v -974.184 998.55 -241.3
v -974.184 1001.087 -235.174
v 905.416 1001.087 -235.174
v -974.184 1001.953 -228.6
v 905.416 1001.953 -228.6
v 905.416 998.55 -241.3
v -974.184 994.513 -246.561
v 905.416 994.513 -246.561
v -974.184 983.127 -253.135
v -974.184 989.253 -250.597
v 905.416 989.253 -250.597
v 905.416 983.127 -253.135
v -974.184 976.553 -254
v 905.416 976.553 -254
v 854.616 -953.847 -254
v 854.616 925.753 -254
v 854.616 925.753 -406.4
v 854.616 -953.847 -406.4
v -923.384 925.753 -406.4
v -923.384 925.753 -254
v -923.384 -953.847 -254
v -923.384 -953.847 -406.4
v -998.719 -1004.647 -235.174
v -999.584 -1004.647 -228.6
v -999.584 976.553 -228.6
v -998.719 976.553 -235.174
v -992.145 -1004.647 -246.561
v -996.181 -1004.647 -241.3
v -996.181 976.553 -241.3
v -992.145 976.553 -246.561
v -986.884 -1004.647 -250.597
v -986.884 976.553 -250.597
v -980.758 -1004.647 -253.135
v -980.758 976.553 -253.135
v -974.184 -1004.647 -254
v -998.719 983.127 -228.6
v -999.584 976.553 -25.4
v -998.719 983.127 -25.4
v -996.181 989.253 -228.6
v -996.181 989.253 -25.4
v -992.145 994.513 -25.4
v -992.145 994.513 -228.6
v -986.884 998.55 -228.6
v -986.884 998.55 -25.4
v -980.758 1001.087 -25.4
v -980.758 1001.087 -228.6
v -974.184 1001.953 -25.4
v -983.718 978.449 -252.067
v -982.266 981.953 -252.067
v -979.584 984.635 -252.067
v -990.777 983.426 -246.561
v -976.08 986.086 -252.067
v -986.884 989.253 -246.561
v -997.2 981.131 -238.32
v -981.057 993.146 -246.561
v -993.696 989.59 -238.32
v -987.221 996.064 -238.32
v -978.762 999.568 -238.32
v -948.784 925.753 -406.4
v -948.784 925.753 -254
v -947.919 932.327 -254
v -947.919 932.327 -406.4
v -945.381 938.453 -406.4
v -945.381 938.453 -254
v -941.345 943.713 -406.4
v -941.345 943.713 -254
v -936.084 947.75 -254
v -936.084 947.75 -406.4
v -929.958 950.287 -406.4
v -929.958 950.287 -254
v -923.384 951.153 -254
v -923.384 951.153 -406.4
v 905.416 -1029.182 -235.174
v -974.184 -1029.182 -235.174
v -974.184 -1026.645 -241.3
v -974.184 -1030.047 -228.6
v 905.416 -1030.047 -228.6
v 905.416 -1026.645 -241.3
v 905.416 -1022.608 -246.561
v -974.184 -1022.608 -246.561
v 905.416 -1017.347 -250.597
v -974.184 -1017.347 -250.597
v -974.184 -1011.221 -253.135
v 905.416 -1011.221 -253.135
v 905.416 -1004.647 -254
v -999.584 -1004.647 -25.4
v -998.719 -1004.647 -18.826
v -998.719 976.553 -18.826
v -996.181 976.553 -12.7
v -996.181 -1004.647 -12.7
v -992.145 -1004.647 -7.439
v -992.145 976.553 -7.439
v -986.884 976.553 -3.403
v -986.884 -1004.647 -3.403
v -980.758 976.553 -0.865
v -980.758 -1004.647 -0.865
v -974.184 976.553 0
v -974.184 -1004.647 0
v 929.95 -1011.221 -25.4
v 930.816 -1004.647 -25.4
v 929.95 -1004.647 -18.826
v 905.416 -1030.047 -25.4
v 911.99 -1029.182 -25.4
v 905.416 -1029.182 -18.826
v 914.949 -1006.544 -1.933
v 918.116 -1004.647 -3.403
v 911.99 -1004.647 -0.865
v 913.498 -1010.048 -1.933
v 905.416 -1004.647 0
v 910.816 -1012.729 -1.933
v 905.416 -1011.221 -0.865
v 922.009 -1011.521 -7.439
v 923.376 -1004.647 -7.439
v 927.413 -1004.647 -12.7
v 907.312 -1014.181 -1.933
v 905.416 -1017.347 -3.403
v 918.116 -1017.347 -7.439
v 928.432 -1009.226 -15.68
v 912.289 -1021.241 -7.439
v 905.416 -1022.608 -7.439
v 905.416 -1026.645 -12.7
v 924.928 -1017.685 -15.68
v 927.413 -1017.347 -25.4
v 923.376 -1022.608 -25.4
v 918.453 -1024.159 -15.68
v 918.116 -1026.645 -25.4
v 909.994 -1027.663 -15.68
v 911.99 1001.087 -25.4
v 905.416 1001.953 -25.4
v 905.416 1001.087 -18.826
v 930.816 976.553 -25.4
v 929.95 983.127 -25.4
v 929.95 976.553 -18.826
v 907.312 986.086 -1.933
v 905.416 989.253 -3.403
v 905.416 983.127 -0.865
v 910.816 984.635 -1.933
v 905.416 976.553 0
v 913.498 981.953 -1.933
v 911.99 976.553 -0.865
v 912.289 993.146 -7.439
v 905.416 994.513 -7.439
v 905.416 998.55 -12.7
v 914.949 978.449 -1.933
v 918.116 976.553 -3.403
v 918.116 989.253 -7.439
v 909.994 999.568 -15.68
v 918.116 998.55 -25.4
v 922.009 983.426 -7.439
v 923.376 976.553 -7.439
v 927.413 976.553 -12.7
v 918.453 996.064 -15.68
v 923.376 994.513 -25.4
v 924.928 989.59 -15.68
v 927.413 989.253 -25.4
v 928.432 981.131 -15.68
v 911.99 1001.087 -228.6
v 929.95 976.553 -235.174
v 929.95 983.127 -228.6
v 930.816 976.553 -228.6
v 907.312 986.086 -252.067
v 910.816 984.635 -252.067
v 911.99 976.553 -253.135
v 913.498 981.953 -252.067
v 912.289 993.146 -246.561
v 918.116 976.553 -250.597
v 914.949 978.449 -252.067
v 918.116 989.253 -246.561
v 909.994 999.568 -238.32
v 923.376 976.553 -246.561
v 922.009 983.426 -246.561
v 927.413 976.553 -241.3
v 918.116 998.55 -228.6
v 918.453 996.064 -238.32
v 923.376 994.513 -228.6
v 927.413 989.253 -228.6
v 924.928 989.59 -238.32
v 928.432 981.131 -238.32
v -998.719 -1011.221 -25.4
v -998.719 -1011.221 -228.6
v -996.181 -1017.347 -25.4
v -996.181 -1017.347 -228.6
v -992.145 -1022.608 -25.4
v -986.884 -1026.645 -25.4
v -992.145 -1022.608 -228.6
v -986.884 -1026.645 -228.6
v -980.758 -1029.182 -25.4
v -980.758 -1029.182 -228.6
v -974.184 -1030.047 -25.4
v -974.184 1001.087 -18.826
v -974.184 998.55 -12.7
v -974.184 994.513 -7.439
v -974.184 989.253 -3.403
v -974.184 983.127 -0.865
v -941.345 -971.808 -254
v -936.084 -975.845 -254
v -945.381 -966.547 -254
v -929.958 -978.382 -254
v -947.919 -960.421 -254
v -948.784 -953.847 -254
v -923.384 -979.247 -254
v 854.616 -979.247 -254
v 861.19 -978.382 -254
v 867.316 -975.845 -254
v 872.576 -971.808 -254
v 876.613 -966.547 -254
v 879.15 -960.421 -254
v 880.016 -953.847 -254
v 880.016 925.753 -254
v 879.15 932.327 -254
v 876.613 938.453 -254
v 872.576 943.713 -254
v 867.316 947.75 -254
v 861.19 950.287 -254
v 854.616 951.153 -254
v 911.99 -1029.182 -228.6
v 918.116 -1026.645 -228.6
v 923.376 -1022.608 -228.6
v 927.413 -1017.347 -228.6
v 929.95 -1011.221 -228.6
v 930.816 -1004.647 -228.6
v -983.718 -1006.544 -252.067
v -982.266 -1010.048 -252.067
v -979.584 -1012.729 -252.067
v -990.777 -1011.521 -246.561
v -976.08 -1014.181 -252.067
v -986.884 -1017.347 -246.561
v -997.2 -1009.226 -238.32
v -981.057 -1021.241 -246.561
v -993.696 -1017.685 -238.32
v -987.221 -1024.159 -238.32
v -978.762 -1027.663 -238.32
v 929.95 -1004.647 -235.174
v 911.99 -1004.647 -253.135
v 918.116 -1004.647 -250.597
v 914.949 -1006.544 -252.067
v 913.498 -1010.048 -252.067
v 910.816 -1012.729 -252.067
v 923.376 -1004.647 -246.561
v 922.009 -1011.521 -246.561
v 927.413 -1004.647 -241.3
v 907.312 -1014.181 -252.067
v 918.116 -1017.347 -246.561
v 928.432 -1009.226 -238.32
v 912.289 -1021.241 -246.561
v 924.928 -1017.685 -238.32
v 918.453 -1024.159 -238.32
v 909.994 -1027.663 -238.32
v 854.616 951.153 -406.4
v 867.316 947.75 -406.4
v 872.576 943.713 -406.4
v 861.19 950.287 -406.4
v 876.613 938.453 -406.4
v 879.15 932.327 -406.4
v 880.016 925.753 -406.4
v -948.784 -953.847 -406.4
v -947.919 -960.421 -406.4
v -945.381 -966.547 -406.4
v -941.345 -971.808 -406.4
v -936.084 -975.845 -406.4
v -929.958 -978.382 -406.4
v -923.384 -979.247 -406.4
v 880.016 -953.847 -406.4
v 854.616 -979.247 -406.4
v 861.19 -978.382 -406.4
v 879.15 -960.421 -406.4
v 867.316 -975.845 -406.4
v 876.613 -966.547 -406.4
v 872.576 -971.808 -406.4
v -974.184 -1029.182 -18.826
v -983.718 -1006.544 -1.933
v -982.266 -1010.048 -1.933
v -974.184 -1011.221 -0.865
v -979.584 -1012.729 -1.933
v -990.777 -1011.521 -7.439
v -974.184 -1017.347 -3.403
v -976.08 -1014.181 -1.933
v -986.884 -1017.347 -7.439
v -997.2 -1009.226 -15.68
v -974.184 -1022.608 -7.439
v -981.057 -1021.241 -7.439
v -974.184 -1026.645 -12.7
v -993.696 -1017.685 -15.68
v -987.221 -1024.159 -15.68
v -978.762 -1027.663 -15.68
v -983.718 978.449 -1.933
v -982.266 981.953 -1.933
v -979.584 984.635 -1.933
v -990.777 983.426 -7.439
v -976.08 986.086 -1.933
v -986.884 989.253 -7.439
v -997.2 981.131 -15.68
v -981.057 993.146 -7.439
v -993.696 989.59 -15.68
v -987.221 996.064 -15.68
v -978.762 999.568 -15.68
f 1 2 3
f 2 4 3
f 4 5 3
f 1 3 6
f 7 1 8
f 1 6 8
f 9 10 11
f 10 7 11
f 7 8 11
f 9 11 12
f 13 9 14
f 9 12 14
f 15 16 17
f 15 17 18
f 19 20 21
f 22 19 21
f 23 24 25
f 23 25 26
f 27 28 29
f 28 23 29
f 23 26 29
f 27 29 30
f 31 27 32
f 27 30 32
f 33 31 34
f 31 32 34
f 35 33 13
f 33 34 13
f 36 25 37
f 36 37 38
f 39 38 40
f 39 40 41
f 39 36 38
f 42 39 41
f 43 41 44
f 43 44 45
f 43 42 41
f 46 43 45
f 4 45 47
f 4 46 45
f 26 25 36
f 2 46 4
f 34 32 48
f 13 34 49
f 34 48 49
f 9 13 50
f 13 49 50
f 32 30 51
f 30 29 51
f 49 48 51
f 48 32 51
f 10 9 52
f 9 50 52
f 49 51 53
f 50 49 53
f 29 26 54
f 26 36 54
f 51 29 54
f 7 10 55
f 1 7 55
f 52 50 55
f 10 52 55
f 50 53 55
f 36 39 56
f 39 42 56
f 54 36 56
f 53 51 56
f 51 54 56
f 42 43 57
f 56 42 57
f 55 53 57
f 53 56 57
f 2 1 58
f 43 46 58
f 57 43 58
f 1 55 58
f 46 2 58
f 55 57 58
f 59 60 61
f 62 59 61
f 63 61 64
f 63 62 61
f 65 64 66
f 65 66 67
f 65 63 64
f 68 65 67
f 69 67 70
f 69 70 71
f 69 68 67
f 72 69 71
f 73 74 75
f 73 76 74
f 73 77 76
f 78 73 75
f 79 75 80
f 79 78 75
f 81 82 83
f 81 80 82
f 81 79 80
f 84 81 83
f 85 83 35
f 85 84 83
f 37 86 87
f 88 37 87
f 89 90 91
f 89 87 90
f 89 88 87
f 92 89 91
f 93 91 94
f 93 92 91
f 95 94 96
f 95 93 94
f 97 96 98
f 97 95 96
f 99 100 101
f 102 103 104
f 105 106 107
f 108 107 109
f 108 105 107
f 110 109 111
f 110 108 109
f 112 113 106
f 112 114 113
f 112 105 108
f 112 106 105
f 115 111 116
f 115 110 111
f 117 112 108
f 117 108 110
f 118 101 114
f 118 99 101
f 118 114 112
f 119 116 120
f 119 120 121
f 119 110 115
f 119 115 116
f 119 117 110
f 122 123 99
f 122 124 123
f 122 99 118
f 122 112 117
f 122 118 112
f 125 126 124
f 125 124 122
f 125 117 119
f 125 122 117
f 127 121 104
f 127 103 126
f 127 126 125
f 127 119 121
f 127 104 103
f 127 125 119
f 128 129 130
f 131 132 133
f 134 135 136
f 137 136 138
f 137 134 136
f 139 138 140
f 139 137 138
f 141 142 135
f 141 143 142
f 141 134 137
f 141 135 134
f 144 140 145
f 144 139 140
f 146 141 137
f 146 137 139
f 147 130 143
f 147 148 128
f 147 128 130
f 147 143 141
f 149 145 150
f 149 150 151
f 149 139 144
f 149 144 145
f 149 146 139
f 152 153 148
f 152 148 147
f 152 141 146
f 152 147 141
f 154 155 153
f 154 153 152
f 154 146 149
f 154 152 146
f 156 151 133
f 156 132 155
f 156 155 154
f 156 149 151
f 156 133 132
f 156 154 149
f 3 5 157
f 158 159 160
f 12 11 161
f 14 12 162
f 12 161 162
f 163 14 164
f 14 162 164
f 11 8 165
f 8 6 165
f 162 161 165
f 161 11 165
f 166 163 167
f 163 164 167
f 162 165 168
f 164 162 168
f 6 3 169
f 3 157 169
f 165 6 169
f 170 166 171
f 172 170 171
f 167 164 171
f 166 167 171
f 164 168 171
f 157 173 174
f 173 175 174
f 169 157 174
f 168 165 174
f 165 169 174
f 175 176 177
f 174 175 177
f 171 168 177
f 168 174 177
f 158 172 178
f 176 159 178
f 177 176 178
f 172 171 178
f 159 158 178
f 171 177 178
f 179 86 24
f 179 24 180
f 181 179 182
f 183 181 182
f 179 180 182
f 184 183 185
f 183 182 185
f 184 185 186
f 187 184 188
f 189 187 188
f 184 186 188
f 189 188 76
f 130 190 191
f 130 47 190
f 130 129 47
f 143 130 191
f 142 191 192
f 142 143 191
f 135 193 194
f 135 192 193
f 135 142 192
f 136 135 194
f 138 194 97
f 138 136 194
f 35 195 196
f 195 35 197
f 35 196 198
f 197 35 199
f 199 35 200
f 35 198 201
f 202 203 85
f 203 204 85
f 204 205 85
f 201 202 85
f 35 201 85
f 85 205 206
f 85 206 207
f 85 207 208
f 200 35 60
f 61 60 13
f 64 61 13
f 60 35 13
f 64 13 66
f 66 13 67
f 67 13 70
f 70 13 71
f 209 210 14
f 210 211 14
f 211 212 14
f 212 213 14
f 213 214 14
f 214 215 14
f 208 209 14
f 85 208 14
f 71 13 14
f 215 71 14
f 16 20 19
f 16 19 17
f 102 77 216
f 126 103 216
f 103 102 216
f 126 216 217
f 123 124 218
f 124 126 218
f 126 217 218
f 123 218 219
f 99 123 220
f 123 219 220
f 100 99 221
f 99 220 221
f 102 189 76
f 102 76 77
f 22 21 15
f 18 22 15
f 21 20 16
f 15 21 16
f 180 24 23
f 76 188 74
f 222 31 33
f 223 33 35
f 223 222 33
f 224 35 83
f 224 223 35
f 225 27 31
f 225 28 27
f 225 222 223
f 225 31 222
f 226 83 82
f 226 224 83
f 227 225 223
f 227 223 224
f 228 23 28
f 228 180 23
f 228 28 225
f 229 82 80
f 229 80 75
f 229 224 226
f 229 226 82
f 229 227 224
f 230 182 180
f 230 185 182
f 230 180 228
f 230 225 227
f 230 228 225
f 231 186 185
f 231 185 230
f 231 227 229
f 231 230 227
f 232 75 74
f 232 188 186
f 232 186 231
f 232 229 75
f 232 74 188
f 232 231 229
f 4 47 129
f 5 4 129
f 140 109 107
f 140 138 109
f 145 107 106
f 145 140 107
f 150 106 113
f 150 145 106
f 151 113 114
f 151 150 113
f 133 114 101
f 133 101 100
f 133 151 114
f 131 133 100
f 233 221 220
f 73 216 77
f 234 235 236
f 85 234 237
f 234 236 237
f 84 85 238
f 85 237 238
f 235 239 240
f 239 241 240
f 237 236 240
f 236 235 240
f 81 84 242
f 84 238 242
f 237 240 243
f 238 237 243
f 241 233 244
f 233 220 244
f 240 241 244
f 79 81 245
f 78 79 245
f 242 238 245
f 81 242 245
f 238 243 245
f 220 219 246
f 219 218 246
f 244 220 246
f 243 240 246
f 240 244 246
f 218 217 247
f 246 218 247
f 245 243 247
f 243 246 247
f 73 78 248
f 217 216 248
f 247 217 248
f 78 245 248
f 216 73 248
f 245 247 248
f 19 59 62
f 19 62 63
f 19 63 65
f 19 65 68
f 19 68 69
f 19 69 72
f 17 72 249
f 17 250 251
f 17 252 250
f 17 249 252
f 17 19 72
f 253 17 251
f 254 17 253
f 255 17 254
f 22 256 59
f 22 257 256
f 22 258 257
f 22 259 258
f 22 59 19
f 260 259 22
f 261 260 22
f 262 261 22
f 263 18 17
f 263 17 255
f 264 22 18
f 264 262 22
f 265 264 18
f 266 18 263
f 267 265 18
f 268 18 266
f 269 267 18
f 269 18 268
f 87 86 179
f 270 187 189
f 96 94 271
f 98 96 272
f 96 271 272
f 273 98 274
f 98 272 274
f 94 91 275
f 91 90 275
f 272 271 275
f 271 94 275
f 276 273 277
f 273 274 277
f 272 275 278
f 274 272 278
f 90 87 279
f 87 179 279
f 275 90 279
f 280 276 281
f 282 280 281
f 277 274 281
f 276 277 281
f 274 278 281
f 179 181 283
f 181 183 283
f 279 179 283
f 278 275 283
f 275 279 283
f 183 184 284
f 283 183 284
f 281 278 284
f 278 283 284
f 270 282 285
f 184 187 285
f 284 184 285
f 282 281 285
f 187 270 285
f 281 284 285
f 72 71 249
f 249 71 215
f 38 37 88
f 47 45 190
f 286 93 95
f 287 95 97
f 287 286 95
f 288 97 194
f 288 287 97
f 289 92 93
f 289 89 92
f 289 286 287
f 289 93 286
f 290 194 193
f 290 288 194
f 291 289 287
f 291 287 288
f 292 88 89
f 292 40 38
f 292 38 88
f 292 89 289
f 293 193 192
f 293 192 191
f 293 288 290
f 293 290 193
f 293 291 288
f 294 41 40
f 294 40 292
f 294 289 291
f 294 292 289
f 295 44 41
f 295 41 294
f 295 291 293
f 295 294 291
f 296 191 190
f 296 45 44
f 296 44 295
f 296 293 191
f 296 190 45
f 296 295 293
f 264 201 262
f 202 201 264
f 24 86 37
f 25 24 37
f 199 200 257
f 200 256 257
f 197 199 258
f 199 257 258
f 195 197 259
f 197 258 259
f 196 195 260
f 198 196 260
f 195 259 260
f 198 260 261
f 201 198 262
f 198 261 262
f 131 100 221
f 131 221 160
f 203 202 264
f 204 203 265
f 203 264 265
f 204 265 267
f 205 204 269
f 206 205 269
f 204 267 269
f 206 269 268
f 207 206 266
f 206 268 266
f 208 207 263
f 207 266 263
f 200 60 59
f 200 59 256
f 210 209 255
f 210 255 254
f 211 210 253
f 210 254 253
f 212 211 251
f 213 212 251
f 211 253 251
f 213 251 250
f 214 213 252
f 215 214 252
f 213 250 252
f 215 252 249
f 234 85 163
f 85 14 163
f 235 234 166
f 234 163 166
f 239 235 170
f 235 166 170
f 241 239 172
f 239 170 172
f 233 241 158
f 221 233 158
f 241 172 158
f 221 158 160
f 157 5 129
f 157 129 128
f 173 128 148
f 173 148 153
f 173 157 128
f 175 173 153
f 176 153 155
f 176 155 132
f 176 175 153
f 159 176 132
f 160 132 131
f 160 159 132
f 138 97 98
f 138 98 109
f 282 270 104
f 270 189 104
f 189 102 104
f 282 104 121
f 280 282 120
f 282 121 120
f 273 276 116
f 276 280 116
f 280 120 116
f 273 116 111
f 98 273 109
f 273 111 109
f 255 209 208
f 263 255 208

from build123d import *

# Parameters (mm, degrees)
F0_W     = 1930.4
F0_H     = 2032
F1_DEPTH = 254
F2_W     = 1828.8
F2_H     = 1930.4
F2_W_2   = 1778
F2_H_2   = 1879.6
F3_DEPTH = 152.4
F4_R     = 25.4


with BuildPart() as f1:
    # F0 (on Top) → F1 (new body)
    with BuildSketch(Plane.XY):
        with Locations((-34.384124, -14.047471)):
            Rectangle(F0_W, F0_H)
    extrude(amount=-F1_DEPTH)

    # F2 (on face) → F3 (join)
    with BuildSketch(Plane(origin=(0, 0, -254), x_dir=(1, 0, 0), z_dir=(0, 0, -1))):
        with Locations((-34.384124, 14.047471)):
            Rectangle(F2_W, F2_H)
        with Locations((-34.384124, 14.047471)):
            Rectangle(F2_W_2, F2_H_2, mode=Mode.SUBTRACT)
    extrude(amount=F3_DEPTH)

    # F4
    f4_edges = [f1.edges().sort_by_distance(p)[0] for p in [
        (-999.584124, 1001.952529, -127),
        (-999.584124, -1030.047471, -127),
        (-999.584124, -14.047471, 0),
        (-999.584124, -14.047471, -254),
        (930.815876, 1001.952529, -127),
        (-34.384124, 1001.952529, 0),
        (-34.384124, 1001.952529, -254),
        (930.815876, -1030.047471, -127),
        (930.815876, -14.047471, 0),
        (930.815876, -14.047471, -254),
        (-34.384124, -1030.047471, 0),
        (-34.384124, -1030.047471, -254),
        (880.015876, -979.247471, -330.2),
        (880.015876, 951.152529, -330.2),
        (-948.784124, 951.152529, -330.2),
        (-948.784124, -979.247471, -330.2),
    ]]
    fillet(f4_edges, radius=F4_R)


solid = f1.part
